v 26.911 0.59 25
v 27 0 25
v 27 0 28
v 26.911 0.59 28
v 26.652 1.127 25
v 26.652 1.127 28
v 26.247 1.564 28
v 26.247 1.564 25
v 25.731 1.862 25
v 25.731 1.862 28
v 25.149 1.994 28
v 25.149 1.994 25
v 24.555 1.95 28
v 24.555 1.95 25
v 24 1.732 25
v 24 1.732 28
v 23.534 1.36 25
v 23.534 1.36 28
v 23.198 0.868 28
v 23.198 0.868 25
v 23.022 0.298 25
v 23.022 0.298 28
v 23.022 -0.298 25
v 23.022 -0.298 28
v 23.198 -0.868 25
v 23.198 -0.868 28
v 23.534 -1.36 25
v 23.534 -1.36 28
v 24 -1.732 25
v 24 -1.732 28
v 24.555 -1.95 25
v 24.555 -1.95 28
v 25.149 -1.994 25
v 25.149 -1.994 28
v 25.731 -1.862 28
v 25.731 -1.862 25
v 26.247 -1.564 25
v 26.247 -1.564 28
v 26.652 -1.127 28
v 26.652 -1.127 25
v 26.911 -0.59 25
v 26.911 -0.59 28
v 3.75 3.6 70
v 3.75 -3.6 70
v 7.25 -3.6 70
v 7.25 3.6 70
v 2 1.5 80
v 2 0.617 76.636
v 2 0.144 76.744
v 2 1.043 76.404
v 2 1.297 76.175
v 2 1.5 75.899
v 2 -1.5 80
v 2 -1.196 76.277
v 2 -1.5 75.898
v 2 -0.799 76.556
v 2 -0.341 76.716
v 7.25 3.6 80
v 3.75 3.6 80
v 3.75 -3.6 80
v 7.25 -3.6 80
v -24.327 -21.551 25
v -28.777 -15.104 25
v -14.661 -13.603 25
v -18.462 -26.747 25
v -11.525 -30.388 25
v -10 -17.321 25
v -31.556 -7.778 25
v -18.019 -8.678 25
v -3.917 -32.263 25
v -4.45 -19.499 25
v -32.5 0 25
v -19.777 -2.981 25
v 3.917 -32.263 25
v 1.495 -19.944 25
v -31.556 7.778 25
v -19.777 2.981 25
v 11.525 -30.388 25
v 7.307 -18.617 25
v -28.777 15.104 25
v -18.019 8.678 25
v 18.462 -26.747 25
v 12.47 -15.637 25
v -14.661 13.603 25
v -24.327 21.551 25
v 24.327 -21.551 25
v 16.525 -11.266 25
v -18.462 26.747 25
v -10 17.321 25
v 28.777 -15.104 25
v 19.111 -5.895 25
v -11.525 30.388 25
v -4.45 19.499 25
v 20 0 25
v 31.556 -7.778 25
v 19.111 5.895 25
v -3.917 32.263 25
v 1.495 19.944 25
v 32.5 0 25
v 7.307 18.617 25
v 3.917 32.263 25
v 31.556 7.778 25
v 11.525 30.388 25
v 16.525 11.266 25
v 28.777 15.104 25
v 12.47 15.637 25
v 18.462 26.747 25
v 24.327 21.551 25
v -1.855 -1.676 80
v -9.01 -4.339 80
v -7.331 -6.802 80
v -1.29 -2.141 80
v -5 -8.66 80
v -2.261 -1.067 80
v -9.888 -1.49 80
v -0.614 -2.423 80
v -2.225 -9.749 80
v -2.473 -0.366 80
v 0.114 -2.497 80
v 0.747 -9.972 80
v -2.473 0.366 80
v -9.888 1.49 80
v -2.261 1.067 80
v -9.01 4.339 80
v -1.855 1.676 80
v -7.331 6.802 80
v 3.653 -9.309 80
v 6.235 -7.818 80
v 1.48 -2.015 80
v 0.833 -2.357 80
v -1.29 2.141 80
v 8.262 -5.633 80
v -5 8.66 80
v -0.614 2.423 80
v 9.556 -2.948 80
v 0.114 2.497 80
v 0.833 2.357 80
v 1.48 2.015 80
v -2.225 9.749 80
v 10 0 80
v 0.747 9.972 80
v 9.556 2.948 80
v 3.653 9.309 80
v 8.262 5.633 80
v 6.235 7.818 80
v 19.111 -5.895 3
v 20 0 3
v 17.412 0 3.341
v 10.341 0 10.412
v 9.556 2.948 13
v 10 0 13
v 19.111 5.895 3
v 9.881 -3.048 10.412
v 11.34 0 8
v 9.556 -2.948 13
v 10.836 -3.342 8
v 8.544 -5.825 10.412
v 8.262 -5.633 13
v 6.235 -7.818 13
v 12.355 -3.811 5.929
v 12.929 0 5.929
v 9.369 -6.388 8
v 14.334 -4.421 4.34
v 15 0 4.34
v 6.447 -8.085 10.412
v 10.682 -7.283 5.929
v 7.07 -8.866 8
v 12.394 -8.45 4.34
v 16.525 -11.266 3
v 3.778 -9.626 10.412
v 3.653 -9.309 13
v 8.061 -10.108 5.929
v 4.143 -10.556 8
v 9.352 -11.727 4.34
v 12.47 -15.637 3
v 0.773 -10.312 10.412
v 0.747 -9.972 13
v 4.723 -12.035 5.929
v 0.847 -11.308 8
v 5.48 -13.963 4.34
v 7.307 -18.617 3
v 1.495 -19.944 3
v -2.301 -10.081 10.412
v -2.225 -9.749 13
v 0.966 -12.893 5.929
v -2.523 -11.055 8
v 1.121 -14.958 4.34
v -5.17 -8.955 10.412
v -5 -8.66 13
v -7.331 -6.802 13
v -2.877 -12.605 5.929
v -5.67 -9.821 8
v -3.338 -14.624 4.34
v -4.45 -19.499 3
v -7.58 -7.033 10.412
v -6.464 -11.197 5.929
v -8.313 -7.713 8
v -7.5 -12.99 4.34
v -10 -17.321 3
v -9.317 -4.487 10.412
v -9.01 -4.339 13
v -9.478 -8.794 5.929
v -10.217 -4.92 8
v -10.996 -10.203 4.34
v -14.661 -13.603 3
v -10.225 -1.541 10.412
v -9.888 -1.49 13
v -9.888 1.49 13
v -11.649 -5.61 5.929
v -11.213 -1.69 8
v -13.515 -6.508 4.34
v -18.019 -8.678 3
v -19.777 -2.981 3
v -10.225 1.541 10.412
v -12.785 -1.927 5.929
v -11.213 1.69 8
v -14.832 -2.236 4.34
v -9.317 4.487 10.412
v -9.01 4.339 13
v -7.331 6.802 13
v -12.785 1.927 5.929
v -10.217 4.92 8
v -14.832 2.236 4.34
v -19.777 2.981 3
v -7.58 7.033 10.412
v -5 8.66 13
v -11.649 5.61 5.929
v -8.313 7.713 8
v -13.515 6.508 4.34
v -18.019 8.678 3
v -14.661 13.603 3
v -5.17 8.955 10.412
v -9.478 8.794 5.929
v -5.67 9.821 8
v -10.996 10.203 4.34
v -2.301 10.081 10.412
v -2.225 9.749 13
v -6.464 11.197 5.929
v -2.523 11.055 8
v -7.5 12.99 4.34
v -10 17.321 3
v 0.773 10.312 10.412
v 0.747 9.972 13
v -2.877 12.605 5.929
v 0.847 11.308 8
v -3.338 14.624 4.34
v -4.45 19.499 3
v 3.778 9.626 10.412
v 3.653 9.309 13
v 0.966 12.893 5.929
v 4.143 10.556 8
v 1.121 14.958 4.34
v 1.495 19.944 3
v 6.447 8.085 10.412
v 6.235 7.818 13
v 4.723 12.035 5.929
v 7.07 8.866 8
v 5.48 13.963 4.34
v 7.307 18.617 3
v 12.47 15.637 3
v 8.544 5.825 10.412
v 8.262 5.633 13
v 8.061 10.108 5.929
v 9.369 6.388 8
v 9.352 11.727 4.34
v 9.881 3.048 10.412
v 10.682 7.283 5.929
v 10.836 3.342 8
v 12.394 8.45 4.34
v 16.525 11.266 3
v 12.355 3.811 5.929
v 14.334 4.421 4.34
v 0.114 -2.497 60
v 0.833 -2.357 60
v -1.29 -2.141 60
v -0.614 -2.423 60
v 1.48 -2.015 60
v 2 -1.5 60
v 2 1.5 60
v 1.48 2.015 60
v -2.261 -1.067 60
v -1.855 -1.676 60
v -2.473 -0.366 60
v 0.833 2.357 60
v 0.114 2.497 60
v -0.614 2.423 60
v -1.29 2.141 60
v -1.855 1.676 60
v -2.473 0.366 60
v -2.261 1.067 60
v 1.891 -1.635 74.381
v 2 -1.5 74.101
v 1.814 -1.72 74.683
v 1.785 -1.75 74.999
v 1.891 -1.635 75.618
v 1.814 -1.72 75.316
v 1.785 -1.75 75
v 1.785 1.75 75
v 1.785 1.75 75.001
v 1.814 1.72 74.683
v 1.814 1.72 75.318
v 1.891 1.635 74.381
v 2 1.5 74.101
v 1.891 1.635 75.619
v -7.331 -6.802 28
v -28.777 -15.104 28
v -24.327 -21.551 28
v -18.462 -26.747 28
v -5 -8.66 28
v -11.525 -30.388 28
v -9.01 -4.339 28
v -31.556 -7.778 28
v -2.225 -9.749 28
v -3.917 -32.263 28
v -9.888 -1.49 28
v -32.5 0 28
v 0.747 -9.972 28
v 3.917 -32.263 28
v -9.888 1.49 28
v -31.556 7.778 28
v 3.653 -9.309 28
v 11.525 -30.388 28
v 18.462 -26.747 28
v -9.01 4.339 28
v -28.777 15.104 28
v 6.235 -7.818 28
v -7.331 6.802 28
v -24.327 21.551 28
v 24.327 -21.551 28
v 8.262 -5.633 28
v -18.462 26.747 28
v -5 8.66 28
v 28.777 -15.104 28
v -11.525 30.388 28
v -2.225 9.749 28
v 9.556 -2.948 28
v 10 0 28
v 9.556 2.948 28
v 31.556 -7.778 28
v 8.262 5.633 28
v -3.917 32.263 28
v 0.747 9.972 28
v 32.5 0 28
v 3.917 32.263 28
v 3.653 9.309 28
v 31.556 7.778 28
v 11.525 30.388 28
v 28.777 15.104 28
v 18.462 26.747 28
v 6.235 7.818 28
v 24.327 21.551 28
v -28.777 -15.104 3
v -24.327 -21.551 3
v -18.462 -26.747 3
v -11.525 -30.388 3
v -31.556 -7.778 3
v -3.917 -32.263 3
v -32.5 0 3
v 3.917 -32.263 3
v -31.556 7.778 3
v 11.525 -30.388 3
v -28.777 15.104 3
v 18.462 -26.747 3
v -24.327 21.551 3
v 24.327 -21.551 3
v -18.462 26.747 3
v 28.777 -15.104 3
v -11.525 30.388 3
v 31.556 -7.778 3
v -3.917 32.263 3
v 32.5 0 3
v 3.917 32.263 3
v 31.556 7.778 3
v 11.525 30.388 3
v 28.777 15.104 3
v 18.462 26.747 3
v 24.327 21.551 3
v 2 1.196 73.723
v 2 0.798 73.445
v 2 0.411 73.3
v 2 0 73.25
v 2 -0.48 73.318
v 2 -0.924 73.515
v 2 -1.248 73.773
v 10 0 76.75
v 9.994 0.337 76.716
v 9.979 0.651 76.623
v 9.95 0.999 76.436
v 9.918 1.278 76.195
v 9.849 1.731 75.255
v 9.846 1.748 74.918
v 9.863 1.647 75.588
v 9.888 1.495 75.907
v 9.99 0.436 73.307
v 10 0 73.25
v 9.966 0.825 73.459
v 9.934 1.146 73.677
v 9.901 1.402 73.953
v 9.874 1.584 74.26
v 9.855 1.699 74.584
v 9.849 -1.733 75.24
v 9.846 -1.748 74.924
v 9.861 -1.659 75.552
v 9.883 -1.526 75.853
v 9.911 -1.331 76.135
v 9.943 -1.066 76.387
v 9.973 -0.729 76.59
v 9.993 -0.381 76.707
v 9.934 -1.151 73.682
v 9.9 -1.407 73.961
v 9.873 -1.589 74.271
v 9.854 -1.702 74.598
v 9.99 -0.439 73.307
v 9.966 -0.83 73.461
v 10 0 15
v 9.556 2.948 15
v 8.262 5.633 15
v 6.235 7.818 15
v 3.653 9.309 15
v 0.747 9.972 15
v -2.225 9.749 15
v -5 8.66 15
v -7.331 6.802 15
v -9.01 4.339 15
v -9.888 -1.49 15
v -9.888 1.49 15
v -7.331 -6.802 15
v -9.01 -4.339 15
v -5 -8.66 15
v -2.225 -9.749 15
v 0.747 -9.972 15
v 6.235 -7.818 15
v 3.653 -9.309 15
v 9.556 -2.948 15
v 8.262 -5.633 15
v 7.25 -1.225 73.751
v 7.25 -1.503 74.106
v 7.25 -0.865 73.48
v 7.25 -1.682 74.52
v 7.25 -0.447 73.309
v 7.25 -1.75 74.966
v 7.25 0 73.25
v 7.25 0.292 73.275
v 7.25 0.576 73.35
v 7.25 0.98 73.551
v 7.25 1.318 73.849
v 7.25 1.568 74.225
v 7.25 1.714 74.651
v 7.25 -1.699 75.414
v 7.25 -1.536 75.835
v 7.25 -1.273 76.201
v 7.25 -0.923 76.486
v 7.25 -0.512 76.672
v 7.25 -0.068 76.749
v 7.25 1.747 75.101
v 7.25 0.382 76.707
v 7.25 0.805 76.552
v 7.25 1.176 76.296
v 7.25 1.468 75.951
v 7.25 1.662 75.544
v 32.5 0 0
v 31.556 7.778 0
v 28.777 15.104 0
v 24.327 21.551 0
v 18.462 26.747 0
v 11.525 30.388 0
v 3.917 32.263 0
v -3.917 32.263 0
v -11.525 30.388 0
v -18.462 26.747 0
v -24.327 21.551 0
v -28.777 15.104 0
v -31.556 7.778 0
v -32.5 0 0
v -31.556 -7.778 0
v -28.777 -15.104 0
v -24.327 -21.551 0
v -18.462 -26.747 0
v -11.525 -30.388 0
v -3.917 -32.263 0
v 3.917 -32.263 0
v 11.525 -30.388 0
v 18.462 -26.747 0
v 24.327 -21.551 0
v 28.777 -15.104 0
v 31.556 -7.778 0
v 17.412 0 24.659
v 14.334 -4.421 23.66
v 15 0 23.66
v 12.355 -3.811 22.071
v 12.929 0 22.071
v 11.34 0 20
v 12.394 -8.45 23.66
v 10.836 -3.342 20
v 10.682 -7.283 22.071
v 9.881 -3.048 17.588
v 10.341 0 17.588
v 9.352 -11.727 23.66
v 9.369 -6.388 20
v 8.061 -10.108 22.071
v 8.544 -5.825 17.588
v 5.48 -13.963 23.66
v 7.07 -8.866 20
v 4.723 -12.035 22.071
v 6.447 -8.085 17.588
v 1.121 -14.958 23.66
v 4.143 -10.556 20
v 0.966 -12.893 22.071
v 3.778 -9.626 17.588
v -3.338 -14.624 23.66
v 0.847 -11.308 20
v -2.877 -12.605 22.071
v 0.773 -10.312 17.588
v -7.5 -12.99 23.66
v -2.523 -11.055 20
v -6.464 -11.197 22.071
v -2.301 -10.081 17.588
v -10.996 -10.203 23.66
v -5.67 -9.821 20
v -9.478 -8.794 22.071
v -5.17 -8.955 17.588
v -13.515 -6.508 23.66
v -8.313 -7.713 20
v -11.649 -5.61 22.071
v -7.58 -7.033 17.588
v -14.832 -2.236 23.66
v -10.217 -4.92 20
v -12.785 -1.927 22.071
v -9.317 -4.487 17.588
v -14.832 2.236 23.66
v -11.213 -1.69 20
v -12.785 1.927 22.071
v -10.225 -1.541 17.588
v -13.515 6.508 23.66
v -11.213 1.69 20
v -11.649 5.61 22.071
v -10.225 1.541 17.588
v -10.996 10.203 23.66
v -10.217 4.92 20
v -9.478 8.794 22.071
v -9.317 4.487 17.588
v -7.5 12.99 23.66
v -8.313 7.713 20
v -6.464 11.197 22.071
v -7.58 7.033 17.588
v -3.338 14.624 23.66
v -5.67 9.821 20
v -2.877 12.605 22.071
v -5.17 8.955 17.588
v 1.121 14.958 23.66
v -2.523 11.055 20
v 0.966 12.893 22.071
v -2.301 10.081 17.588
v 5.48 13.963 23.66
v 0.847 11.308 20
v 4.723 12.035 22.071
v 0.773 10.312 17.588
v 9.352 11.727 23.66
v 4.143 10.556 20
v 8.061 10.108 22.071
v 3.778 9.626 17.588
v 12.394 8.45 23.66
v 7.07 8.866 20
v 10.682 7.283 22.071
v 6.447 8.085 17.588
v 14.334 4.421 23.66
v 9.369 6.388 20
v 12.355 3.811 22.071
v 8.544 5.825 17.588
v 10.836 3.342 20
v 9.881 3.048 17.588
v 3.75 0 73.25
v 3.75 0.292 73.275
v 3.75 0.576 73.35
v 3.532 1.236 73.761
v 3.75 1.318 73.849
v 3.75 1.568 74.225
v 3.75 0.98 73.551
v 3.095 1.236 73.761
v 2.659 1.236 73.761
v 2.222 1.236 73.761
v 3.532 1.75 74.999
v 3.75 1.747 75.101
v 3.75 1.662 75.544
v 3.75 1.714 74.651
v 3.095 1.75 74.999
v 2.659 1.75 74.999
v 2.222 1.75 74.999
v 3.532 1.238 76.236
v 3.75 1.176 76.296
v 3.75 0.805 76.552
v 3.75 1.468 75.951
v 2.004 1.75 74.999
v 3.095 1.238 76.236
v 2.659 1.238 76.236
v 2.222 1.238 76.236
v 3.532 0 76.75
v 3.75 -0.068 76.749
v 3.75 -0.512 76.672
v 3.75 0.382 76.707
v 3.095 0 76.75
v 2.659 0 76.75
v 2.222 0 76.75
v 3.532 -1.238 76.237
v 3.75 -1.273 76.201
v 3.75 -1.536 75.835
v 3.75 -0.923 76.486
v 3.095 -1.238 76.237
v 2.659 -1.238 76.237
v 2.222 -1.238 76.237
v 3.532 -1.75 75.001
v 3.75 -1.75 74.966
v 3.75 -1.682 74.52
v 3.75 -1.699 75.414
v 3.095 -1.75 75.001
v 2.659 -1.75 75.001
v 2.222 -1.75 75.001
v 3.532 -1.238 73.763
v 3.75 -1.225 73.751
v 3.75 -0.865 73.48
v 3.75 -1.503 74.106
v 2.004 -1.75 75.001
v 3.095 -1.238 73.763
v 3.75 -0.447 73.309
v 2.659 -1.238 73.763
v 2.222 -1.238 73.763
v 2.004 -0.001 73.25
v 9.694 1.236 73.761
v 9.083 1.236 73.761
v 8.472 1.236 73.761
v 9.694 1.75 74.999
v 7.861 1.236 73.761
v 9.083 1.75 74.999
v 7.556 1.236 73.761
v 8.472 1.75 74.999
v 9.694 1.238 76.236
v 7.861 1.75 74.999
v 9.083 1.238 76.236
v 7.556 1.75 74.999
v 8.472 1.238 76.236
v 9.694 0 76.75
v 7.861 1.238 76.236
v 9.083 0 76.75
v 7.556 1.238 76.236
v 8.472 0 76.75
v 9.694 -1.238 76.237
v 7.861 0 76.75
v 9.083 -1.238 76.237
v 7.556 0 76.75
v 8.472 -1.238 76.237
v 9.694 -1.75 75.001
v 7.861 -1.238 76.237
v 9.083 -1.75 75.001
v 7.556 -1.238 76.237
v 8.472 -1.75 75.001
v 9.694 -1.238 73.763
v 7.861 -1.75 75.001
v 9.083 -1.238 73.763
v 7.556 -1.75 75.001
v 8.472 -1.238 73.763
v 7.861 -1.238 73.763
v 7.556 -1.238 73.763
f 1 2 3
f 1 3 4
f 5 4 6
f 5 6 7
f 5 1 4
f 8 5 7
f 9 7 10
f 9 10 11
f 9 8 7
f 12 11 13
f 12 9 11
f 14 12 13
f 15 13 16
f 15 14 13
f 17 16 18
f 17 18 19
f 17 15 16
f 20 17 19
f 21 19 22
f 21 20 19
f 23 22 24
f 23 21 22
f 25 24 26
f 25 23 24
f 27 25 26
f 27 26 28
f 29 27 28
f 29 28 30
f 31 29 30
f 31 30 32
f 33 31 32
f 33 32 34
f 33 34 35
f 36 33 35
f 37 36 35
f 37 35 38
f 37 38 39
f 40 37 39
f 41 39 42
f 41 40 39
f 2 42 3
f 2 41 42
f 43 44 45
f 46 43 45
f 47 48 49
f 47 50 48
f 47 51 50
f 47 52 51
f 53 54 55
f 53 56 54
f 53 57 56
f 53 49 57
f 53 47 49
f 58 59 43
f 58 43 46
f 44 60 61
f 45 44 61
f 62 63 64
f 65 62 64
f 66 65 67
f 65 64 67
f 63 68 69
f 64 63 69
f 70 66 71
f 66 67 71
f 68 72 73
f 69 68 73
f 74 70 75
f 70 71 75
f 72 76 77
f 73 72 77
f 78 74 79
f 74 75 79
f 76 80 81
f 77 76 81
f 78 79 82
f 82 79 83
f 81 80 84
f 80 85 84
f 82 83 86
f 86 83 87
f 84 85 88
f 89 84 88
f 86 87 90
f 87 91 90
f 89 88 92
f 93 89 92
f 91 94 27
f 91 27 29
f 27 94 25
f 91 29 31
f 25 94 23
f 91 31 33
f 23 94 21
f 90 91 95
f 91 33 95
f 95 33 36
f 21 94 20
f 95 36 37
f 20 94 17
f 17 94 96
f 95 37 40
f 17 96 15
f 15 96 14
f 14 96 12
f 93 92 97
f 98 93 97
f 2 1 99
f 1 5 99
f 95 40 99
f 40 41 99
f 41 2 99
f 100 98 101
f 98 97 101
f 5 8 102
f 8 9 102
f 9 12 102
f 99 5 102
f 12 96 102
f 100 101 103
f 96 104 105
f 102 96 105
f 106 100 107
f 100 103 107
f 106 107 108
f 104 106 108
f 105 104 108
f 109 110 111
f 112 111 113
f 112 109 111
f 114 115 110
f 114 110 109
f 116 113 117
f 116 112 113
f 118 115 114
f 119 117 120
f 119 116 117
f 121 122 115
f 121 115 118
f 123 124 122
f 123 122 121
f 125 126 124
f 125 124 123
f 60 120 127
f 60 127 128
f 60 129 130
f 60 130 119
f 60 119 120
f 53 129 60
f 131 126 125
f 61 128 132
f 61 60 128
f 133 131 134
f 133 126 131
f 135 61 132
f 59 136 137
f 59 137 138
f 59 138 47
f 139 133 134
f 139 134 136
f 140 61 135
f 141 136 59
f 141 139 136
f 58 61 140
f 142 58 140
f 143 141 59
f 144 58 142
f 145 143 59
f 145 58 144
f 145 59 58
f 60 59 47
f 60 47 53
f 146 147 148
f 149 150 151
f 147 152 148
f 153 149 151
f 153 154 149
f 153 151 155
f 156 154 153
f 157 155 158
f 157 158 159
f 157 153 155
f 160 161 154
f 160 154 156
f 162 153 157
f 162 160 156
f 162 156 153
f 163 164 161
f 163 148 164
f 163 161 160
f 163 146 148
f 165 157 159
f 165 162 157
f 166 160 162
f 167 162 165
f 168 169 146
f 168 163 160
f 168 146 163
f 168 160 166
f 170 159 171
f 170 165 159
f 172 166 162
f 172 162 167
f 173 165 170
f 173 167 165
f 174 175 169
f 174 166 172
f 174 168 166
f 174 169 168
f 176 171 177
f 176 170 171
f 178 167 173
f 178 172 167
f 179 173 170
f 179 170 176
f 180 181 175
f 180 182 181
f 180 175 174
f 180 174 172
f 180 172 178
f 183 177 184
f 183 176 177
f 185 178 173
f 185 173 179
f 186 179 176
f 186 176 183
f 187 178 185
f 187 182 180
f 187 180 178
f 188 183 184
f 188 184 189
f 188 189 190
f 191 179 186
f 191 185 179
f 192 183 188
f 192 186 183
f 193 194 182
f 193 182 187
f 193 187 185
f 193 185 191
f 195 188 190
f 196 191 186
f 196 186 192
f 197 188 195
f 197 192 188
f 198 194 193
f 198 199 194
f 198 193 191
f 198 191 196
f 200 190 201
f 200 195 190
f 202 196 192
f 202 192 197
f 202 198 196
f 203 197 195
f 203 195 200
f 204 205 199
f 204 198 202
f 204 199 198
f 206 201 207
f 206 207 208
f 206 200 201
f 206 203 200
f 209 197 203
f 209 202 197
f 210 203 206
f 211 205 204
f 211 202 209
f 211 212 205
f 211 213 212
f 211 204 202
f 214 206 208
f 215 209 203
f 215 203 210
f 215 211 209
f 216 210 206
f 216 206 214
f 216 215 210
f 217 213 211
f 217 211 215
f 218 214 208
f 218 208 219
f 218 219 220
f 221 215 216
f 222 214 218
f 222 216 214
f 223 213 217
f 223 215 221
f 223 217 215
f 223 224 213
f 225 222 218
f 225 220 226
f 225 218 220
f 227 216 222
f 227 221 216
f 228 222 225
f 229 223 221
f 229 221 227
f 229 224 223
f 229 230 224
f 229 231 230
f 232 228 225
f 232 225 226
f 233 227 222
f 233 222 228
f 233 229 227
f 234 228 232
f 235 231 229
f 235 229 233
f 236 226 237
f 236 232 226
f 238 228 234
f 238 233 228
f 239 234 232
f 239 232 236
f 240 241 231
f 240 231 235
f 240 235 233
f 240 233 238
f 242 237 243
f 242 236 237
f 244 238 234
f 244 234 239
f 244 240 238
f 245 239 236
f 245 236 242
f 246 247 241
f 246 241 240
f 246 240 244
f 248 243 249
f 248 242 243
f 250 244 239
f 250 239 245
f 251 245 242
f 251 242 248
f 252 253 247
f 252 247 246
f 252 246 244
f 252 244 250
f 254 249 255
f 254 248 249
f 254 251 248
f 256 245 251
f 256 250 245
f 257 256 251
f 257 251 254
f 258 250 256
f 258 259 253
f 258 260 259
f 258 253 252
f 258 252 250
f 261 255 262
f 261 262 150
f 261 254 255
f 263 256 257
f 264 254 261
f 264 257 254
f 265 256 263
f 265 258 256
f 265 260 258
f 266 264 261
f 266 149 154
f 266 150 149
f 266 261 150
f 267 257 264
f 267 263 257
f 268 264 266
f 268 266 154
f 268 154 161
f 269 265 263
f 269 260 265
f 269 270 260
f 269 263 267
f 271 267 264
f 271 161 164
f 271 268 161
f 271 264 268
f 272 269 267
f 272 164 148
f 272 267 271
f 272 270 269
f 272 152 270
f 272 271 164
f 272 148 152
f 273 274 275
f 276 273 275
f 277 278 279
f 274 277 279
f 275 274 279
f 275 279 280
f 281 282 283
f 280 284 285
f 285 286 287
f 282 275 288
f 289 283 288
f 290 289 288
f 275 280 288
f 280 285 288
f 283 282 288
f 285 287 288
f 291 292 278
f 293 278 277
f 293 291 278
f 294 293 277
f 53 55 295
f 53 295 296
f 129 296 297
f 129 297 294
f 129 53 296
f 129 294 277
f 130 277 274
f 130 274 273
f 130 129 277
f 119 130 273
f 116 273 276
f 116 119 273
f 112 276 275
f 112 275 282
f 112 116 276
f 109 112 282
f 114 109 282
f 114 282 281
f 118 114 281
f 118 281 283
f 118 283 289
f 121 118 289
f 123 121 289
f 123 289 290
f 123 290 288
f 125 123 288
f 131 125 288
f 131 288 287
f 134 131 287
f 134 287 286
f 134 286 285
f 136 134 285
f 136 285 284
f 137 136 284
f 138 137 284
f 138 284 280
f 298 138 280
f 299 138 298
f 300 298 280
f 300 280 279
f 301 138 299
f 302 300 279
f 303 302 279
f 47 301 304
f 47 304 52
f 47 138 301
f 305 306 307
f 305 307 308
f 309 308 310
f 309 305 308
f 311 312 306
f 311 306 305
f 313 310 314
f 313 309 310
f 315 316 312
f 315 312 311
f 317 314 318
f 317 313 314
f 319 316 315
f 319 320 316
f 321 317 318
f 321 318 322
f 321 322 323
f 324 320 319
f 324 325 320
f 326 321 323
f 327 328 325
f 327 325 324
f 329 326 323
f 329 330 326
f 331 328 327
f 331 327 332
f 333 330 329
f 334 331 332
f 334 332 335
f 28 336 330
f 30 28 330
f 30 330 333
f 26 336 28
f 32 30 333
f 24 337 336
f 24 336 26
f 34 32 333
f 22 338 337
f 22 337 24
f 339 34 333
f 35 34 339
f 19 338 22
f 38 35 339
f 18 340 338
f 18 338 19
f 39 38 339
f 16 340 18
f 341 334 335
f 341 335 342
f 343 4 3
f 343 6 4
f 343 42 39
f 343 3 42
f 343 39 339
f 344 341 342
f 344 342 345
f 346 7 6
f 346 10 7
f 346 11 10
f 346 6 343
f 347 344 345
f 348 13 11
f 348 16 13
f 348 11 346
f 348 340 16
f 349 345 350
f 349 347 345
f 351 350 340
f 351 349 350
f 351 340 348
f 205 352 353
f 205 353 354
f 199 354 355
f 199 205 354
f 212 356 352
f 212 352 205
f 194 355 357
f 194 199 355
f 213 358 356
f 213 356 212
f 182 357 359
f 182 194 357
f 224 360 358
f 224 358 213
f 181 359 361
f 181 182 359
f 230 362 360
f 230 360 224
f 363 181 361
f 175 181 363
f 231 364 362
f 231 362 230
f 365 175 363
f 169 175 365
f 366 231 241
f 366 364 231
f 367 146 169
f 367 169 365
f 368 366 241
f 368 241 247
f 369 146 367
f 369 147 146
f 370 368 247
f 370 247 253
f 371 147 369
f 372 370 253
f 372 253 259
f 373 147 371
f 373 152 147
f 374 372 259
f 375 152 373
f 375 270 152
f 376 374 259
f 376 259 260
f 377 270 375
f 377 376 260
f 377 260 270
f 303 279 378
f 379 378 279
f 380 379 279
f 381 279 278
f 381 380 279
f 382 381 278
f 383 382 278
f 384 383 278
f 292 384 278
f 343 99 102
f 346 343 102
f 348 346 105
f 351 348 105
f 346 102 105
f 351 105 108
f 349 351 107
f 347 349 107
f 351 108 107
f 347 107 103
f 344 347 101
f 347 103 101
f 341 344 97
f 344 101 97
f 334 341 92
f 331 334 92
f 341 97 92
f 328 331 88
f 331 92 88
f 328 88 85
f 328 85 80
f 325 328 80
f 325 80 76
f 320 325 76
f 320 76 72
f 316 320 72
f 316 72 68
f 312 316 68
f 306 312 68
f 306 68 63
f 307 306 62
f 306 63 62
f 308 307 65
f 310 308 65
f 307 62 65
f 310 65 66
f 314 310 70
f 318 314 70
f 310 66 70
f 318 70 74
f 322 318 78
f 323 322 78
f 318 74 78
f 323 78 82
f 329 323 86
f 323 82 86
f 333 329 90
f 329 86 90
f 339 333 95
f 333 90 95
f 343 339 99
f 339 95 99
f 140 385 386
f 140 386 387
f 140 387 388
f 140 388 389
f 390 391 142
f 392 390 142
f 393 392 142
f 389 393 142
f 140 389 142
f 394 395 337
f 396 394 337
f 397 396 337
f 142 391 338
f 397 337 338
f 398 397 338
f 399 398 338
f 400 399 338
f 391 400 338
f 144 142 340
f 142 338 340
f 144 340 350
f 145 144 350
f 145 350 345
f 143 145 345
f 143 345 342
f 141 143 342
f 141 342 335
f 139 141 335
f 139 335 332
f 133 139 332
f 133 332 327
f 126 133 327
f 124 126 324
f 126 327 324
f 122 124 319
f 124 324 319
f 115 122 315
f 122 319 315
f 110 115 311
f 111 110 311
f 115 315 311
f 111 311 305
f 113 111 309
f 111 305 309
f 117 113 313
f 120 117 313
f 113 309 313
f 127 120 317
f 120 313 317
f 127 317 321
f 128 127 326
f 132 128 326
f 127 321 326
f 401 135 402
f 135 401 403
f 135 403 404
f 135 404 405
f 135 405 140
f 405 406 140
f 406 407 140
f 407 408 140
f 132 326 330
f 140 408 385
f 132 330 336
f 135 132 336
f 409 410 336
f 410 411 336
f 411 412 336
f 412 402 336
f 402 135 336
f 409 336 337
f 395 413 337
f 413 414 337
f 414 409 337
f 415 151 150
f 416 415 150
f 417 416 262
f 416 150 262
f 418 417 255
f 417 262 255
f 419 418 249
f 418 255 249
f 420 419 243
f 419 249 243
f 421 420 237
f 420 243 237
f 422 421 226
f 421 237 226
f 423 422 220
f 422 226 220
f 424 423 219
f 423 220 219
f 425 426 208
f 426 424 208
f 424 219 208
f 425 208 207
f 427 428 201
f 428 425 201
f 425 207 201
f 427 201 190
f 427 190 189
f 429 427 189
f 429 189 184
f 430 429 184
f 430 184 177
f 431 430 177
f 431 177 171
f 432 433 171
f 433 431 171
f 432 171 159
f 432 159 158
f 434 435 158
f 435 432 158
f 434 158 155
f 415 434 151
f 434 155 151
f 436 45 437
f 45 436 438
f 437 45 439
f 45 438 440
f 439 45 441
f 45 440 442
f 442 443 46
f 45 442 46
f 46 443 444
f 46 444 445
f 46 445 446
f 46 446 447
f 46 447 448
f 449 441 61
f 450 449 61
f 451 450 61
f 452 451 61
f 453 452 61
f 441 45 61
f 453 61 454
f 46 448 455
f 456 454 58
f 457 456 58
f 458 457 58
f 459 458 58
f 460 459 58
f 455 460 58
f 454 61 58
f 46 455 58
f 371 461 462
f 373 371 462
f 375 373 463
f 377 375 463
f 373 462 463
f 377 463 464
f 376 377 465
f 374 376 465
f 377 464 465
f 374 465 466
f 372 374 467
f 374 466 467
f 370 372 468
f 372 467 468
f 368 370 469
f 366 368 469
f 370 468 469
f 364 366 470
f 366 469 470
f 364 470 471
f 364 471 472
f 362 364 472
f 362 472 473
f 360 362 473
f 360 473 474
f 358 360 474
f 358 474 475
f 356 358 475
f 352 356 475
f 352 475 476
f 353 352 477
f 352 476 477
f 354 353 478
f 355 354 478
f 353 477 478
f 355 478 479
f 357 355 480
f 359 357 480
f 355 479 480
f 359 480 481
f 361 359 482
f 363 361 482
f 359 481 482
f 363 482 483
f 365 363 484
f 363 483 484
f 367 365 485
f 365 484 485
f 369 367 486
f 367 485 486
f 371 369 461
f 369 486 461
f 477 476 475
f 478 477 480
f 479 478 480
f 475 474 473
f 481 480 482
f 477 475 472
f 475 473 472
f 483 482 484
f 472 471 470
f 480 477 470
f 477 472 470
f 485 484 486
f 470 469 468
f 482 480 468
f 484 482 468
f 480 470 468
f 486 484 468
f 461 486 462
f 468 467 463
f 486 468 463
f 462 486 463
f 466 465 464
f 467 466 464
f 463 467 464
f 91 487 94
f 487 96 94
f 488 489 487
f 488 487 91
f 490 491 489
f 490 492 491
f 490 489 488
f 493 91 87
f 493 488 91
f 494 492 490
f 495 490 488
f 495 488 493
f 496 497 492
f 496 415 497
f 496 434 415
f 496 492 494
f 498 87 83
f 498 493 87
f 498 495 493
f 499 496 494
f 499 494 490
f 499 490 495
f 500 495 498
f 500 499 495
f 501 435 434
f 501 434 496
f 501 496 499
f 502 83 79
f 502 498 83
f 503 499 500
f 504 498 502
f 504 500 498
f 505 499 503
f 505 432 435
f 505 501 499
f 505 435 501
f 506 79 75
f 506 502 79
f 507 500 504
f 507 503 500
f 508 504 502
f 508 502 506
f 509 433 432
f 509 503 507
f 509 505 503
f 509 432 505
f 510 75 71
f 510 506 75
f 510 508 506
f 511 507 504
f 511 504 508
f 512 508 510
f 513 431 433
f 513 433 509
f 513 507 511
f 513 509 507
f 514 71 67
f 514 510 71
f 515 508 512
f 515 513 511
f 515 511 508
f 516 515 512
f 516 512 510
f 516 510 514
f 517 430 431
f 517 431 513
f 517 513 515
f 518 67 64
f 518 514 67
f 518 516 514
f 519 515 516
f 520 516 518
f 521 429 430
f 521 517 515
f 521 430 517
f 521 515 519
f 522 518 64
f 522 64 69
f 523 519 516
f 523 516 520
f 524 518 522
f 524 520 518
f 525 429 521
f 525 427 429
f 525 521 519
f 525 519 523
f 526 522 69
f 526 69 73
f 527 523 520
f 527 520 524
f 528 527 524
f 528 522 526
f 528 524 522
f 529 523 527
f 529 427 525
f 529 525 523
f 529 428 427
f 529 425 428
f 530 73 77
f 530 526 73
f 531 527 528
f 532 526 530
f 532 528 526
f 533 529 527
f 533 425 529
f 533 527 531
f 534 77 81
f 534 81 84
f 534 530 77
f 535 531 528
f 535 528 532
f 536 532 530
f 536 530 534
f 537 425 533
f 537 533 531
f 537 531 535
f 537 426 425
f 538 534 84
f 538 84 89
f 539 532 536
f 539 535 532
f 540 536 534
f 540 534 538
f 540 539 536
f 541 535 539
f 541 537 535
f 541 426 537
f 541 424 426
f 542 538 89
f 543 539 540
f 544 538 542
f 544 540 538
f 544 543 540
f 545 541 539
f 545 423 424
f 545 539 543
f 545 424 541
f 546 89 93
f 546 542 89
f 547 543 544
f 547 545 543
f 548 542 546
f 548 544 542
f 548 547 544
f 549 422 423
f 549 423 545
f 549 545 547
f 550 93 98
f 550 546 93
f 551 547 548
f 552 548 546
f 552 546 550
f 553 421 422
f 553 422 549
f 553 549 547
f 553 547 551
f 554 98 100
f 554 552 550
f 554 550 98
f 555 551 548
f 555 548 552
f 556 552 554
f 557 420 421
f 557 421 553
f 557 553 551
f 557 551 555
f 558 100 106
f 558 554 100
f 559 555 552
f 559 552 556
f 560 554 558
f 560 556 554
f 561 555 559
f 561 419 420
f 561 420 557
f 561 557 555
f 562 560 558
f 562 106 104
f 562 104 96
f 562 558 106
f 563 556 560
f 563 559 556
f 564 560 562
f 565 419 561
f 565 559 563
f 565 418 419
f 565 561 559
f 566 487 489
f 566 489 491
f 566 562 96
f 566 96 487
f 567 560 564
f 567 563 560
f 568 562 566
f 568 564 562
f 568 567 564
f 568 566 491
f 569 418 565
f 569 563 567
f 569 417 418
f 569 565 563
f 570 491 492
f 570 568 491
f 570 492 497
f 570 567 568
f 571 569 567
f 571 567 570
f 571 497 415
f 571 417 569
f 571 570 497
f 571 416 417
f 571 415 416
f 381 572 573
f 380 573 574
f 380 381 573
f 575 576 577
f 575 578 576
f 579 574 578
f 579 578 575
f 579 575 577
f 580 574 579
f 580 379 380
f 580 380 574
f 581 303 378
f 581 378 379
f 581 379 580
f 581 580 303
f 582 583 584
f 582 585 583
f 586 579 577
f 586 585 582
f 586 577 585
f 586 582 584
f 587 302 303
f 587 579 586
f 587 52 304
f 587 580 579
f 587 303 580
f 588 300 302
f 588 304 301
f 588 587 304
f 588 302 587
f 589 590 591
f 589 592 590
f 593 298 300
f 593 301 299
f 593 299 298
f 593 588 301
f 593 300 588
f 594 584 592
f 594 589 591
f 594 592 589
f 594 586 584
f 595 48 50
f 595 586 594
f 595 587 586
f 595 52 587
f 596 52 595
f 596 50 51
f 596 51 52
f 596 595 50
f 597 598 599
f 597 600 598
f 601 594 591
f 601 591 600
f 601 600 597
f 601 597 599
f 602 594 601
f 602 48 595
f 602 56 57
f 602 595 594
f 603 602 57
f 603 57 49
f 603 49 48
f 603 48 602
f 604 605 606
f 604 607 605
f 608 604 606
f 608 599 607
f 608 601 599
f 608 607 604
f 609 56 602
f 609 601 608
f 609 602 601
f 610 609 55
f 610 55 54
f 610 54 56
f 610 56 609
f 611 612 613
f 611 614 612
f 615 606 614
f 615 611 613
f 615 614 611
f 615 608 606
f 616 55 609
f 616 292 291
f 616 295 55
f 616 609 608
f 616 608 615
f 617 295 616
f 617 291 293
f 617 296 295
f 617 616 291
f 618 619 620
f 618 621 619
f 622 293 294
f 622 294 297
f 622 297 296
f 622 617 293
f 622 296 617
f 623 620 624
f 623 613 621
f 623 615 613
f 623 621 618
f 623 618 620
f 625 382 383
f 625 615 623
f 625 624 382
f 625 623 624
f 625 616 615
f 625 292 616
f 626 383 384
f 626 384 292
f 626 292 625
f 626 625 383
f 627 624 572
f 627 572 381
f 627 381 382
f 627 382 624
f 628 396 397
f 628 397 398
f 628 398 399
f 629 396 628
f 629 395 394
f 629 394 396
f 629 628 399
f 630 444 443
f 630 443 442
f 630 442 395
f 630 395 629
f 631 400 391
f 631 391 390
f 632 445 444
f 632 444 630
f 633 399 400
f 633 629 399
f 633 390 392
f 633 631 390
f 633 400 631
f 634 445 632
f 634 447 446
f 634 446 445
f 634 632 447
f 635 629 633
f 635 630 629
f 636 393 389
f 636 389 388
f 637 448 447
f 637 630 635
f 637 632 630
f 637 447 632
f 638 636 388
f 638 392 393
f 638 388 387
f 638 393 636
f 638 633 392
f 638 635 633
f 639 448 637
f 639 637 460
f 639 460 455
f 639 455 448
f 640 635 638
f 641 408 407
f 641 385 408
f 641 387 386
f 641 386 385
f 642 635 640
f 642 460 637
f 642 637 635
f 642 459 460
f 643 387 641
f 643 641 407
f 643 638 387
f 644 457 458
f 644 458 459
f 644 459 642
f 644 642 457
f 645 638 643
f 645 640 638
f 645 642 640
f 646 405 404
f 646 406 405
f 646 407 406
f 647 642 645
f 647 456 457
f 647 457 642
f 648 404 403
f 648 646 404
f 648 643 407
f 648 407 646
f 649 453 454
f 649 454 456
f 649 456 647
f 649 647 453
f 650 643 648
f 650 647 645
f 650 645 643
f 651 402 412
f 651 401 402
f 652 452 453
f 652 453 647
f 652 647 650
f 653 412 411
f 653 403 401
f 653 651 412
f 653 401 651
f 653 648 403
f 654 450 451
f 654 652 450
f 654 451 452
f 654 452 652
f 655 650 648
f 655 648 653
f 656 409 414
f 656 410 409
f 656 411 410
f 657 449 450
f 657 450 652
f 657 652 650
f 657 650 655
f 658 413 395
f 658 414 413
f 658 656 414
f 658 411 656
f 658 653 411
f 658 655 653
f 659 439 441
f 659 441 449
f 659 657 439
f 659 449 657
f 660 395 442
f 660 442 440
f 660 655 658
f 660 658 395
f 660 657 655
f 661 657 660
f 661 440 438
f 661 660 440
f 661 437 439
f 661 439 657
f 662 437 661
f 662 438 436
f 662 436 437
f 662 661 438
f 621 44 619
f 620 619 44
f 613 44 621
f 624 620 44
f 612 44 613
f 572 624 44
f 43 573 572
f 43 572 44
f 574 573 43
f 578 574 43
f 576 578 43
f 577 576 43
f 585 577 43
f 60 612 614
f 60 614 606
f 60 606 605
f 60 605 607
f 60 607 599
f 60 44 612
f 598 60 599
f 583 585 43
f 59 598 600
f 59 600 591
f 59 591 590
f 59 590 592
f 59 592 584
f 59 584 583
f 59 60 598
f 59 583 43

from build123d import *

# Parameters (mm, degrees)
CROQUIS1_R              = 10
SALIENTE_EXTRUIR2_DEPTH = 80
CROQUIS4_R              = 32.5
SALIENTE_EXTRUIR3_DEPTH = 3
SALIENTE_EXTRUIR4_START = 25
CROQUIS5_R              = 32.5
SALIENTE_EXTRUIR4_DEPTH = 3
REDONDEO2_R             = 10
CORTAR_EXTRUIR1_START   = 80
CORTAR_EXTRUIR1_DEPTH   = 20
CORTAR_EXTRUIR2_START   = 80
CROQUIS7_W              = 3.5
CROQUIS7_H              = 7.2
CORTAR_EXTRUIR2_DEPTH   = 10
CORTAR_EXTRUIR3_START   = 1.785357468
CORTAR_EXTRUIR3_DEPTH   = 8.214642632
CORTAR_EXTRUIR4_START   = 25
CROQUIS9_R              = 2
CORTAR_EXTRUIR4_DEPTH   = 3


# Read off the part's stored shape, not the designer's step: Cortar-Extruir3
with BuildPart() as part:
    # Croquis1 → Saliente-Extruir2 (new body)
    with BuildSketch(Plane.XY):
        Circle(CROQUIS1_R)
    extrude(amount=SALIENTE_EXTRUIR2_DEPTH)

    # Croquis4 → Saliente-Extruir3 (add)
    with BuildSketch(Plane.XY):
        Circle(CROQUIS4_R)
    extrude(amount=SALIENTE_EXTRUIR3_DEPTH)

    # Croquis5 → Saliente-Extruir4 (add)
    with BuildSketch(Plane.XY.offset(SALIENTE_EXTRUIR4_START)):
        Circle(CROQUIS5_R)
    extrude(amount=SALIENTE_EXTRUIR4_DEPTH)

    # Redondeo2
    redondeo2_edges = [part.edges().sort_by_distance(p)[0] for p in [
        (-10, 0, 25),
        (-10, 0, 3),
    ]]
    fillet(redondeo2_edges, radius=REDONDEO2_R)

    # Croquis6 → Cortar-Extruir1 (cut)
    with BuildSketch(Plane.XY.offset(CORTAR_EXTRUIR1_START)):
        with BuildLine():
            Line((2, 1.5), (2, -1.5))
            ThreePointArc((2, -1.5), (-2.5, 0), (2, 1.5))
        make_face()
    extrude(amount=-CORTAR_EXTRUIR1_DEPTH, mode=Mode.SUBTRACT)

    # Croquis7 → Cortar-Extruir2 (cut)
    with BuildSketch(Plane.XY.offset(CORTAR_EXTRUIR2_START)):
        with Locations((5.5, 0)):
            Rectangle(CROQUIS7_W, CROQUIS7_H)
    extrude(amount=-CORTAR_EXTRUIR2_DEPTH, mode=Mode.SUBTRACT)

    # Cortar-Extruir3 outline → Cortar-Extruir3 (cut)
    with BuildSketch(Plane(origin=(0, 0, 0), x_dir=(0, 0, -1), z_dir=(1, 0, 0)).offset(CORTAR_EXTRUIR3_START)):
        with BuildLine():
            add(Edge.make_bspline(
                [(-73.250000008, 0), (-73.250010298, 0.457042806), (-73.439269311, 0.913556657), (-73.761440573, 1.236313288), (-74.083774062, 1.559232356), (-74.536167707, 1.749638189), (-74.998632957, 1.749999466), (-75.46109828, 1.75036072), (-75.914256207, 1.560125437), (-76.558728463, 0.916635921), (-76.75, 0.463408547), (-76.75, -0.463408547), (-76.559497121, -0.915462775), (-75.915045576, -1.559741953), (-75.458501248, -1.749734355), (-74.543528816, -1.750265056), (-74.088756627, -1.563446648), (-73.437067231, -0.912124478), (-73.250180582, -0.457964068), (-73.250000045, -0.000460382), (-73.250000003, -0.000230191), (-73.250000008, 0)],
                knots=[0.500062925, 0.500062925, 0.500062925, 0.500062925, 0.625, 0.625, 0.625000034, 0.750000005, 0.750000005, 0.750000019, 0.875000002, 0.875000002, 0.999999997, 0.999999997, 1.124999993, 1.124999993, 1.24999999, 1.24999999, 1.374999987, 1.374999987, 1.499999981, 1.499999981, 1.500062906, 1.500062906, 1.500062906, 1.500062906], degree=3))
        make_face()
    extrude(amount=CORTAR_EXTRUIR3_DEPTH, mode=Mode.SUBTRACT)

    # Croquis9 → Cortar-Extruir4 (cut)
    with BuildSketch(Plane.XY.offset(CORTAR_EXTRUIR4_START)):
        with Locations((25, 0)):
            Circle(CROQUIS9_R)
    extrude(amount=CORTAR_EXTRUIR4_DEPTH, mode=Mode.SUBTRACT)


solid = part.part
